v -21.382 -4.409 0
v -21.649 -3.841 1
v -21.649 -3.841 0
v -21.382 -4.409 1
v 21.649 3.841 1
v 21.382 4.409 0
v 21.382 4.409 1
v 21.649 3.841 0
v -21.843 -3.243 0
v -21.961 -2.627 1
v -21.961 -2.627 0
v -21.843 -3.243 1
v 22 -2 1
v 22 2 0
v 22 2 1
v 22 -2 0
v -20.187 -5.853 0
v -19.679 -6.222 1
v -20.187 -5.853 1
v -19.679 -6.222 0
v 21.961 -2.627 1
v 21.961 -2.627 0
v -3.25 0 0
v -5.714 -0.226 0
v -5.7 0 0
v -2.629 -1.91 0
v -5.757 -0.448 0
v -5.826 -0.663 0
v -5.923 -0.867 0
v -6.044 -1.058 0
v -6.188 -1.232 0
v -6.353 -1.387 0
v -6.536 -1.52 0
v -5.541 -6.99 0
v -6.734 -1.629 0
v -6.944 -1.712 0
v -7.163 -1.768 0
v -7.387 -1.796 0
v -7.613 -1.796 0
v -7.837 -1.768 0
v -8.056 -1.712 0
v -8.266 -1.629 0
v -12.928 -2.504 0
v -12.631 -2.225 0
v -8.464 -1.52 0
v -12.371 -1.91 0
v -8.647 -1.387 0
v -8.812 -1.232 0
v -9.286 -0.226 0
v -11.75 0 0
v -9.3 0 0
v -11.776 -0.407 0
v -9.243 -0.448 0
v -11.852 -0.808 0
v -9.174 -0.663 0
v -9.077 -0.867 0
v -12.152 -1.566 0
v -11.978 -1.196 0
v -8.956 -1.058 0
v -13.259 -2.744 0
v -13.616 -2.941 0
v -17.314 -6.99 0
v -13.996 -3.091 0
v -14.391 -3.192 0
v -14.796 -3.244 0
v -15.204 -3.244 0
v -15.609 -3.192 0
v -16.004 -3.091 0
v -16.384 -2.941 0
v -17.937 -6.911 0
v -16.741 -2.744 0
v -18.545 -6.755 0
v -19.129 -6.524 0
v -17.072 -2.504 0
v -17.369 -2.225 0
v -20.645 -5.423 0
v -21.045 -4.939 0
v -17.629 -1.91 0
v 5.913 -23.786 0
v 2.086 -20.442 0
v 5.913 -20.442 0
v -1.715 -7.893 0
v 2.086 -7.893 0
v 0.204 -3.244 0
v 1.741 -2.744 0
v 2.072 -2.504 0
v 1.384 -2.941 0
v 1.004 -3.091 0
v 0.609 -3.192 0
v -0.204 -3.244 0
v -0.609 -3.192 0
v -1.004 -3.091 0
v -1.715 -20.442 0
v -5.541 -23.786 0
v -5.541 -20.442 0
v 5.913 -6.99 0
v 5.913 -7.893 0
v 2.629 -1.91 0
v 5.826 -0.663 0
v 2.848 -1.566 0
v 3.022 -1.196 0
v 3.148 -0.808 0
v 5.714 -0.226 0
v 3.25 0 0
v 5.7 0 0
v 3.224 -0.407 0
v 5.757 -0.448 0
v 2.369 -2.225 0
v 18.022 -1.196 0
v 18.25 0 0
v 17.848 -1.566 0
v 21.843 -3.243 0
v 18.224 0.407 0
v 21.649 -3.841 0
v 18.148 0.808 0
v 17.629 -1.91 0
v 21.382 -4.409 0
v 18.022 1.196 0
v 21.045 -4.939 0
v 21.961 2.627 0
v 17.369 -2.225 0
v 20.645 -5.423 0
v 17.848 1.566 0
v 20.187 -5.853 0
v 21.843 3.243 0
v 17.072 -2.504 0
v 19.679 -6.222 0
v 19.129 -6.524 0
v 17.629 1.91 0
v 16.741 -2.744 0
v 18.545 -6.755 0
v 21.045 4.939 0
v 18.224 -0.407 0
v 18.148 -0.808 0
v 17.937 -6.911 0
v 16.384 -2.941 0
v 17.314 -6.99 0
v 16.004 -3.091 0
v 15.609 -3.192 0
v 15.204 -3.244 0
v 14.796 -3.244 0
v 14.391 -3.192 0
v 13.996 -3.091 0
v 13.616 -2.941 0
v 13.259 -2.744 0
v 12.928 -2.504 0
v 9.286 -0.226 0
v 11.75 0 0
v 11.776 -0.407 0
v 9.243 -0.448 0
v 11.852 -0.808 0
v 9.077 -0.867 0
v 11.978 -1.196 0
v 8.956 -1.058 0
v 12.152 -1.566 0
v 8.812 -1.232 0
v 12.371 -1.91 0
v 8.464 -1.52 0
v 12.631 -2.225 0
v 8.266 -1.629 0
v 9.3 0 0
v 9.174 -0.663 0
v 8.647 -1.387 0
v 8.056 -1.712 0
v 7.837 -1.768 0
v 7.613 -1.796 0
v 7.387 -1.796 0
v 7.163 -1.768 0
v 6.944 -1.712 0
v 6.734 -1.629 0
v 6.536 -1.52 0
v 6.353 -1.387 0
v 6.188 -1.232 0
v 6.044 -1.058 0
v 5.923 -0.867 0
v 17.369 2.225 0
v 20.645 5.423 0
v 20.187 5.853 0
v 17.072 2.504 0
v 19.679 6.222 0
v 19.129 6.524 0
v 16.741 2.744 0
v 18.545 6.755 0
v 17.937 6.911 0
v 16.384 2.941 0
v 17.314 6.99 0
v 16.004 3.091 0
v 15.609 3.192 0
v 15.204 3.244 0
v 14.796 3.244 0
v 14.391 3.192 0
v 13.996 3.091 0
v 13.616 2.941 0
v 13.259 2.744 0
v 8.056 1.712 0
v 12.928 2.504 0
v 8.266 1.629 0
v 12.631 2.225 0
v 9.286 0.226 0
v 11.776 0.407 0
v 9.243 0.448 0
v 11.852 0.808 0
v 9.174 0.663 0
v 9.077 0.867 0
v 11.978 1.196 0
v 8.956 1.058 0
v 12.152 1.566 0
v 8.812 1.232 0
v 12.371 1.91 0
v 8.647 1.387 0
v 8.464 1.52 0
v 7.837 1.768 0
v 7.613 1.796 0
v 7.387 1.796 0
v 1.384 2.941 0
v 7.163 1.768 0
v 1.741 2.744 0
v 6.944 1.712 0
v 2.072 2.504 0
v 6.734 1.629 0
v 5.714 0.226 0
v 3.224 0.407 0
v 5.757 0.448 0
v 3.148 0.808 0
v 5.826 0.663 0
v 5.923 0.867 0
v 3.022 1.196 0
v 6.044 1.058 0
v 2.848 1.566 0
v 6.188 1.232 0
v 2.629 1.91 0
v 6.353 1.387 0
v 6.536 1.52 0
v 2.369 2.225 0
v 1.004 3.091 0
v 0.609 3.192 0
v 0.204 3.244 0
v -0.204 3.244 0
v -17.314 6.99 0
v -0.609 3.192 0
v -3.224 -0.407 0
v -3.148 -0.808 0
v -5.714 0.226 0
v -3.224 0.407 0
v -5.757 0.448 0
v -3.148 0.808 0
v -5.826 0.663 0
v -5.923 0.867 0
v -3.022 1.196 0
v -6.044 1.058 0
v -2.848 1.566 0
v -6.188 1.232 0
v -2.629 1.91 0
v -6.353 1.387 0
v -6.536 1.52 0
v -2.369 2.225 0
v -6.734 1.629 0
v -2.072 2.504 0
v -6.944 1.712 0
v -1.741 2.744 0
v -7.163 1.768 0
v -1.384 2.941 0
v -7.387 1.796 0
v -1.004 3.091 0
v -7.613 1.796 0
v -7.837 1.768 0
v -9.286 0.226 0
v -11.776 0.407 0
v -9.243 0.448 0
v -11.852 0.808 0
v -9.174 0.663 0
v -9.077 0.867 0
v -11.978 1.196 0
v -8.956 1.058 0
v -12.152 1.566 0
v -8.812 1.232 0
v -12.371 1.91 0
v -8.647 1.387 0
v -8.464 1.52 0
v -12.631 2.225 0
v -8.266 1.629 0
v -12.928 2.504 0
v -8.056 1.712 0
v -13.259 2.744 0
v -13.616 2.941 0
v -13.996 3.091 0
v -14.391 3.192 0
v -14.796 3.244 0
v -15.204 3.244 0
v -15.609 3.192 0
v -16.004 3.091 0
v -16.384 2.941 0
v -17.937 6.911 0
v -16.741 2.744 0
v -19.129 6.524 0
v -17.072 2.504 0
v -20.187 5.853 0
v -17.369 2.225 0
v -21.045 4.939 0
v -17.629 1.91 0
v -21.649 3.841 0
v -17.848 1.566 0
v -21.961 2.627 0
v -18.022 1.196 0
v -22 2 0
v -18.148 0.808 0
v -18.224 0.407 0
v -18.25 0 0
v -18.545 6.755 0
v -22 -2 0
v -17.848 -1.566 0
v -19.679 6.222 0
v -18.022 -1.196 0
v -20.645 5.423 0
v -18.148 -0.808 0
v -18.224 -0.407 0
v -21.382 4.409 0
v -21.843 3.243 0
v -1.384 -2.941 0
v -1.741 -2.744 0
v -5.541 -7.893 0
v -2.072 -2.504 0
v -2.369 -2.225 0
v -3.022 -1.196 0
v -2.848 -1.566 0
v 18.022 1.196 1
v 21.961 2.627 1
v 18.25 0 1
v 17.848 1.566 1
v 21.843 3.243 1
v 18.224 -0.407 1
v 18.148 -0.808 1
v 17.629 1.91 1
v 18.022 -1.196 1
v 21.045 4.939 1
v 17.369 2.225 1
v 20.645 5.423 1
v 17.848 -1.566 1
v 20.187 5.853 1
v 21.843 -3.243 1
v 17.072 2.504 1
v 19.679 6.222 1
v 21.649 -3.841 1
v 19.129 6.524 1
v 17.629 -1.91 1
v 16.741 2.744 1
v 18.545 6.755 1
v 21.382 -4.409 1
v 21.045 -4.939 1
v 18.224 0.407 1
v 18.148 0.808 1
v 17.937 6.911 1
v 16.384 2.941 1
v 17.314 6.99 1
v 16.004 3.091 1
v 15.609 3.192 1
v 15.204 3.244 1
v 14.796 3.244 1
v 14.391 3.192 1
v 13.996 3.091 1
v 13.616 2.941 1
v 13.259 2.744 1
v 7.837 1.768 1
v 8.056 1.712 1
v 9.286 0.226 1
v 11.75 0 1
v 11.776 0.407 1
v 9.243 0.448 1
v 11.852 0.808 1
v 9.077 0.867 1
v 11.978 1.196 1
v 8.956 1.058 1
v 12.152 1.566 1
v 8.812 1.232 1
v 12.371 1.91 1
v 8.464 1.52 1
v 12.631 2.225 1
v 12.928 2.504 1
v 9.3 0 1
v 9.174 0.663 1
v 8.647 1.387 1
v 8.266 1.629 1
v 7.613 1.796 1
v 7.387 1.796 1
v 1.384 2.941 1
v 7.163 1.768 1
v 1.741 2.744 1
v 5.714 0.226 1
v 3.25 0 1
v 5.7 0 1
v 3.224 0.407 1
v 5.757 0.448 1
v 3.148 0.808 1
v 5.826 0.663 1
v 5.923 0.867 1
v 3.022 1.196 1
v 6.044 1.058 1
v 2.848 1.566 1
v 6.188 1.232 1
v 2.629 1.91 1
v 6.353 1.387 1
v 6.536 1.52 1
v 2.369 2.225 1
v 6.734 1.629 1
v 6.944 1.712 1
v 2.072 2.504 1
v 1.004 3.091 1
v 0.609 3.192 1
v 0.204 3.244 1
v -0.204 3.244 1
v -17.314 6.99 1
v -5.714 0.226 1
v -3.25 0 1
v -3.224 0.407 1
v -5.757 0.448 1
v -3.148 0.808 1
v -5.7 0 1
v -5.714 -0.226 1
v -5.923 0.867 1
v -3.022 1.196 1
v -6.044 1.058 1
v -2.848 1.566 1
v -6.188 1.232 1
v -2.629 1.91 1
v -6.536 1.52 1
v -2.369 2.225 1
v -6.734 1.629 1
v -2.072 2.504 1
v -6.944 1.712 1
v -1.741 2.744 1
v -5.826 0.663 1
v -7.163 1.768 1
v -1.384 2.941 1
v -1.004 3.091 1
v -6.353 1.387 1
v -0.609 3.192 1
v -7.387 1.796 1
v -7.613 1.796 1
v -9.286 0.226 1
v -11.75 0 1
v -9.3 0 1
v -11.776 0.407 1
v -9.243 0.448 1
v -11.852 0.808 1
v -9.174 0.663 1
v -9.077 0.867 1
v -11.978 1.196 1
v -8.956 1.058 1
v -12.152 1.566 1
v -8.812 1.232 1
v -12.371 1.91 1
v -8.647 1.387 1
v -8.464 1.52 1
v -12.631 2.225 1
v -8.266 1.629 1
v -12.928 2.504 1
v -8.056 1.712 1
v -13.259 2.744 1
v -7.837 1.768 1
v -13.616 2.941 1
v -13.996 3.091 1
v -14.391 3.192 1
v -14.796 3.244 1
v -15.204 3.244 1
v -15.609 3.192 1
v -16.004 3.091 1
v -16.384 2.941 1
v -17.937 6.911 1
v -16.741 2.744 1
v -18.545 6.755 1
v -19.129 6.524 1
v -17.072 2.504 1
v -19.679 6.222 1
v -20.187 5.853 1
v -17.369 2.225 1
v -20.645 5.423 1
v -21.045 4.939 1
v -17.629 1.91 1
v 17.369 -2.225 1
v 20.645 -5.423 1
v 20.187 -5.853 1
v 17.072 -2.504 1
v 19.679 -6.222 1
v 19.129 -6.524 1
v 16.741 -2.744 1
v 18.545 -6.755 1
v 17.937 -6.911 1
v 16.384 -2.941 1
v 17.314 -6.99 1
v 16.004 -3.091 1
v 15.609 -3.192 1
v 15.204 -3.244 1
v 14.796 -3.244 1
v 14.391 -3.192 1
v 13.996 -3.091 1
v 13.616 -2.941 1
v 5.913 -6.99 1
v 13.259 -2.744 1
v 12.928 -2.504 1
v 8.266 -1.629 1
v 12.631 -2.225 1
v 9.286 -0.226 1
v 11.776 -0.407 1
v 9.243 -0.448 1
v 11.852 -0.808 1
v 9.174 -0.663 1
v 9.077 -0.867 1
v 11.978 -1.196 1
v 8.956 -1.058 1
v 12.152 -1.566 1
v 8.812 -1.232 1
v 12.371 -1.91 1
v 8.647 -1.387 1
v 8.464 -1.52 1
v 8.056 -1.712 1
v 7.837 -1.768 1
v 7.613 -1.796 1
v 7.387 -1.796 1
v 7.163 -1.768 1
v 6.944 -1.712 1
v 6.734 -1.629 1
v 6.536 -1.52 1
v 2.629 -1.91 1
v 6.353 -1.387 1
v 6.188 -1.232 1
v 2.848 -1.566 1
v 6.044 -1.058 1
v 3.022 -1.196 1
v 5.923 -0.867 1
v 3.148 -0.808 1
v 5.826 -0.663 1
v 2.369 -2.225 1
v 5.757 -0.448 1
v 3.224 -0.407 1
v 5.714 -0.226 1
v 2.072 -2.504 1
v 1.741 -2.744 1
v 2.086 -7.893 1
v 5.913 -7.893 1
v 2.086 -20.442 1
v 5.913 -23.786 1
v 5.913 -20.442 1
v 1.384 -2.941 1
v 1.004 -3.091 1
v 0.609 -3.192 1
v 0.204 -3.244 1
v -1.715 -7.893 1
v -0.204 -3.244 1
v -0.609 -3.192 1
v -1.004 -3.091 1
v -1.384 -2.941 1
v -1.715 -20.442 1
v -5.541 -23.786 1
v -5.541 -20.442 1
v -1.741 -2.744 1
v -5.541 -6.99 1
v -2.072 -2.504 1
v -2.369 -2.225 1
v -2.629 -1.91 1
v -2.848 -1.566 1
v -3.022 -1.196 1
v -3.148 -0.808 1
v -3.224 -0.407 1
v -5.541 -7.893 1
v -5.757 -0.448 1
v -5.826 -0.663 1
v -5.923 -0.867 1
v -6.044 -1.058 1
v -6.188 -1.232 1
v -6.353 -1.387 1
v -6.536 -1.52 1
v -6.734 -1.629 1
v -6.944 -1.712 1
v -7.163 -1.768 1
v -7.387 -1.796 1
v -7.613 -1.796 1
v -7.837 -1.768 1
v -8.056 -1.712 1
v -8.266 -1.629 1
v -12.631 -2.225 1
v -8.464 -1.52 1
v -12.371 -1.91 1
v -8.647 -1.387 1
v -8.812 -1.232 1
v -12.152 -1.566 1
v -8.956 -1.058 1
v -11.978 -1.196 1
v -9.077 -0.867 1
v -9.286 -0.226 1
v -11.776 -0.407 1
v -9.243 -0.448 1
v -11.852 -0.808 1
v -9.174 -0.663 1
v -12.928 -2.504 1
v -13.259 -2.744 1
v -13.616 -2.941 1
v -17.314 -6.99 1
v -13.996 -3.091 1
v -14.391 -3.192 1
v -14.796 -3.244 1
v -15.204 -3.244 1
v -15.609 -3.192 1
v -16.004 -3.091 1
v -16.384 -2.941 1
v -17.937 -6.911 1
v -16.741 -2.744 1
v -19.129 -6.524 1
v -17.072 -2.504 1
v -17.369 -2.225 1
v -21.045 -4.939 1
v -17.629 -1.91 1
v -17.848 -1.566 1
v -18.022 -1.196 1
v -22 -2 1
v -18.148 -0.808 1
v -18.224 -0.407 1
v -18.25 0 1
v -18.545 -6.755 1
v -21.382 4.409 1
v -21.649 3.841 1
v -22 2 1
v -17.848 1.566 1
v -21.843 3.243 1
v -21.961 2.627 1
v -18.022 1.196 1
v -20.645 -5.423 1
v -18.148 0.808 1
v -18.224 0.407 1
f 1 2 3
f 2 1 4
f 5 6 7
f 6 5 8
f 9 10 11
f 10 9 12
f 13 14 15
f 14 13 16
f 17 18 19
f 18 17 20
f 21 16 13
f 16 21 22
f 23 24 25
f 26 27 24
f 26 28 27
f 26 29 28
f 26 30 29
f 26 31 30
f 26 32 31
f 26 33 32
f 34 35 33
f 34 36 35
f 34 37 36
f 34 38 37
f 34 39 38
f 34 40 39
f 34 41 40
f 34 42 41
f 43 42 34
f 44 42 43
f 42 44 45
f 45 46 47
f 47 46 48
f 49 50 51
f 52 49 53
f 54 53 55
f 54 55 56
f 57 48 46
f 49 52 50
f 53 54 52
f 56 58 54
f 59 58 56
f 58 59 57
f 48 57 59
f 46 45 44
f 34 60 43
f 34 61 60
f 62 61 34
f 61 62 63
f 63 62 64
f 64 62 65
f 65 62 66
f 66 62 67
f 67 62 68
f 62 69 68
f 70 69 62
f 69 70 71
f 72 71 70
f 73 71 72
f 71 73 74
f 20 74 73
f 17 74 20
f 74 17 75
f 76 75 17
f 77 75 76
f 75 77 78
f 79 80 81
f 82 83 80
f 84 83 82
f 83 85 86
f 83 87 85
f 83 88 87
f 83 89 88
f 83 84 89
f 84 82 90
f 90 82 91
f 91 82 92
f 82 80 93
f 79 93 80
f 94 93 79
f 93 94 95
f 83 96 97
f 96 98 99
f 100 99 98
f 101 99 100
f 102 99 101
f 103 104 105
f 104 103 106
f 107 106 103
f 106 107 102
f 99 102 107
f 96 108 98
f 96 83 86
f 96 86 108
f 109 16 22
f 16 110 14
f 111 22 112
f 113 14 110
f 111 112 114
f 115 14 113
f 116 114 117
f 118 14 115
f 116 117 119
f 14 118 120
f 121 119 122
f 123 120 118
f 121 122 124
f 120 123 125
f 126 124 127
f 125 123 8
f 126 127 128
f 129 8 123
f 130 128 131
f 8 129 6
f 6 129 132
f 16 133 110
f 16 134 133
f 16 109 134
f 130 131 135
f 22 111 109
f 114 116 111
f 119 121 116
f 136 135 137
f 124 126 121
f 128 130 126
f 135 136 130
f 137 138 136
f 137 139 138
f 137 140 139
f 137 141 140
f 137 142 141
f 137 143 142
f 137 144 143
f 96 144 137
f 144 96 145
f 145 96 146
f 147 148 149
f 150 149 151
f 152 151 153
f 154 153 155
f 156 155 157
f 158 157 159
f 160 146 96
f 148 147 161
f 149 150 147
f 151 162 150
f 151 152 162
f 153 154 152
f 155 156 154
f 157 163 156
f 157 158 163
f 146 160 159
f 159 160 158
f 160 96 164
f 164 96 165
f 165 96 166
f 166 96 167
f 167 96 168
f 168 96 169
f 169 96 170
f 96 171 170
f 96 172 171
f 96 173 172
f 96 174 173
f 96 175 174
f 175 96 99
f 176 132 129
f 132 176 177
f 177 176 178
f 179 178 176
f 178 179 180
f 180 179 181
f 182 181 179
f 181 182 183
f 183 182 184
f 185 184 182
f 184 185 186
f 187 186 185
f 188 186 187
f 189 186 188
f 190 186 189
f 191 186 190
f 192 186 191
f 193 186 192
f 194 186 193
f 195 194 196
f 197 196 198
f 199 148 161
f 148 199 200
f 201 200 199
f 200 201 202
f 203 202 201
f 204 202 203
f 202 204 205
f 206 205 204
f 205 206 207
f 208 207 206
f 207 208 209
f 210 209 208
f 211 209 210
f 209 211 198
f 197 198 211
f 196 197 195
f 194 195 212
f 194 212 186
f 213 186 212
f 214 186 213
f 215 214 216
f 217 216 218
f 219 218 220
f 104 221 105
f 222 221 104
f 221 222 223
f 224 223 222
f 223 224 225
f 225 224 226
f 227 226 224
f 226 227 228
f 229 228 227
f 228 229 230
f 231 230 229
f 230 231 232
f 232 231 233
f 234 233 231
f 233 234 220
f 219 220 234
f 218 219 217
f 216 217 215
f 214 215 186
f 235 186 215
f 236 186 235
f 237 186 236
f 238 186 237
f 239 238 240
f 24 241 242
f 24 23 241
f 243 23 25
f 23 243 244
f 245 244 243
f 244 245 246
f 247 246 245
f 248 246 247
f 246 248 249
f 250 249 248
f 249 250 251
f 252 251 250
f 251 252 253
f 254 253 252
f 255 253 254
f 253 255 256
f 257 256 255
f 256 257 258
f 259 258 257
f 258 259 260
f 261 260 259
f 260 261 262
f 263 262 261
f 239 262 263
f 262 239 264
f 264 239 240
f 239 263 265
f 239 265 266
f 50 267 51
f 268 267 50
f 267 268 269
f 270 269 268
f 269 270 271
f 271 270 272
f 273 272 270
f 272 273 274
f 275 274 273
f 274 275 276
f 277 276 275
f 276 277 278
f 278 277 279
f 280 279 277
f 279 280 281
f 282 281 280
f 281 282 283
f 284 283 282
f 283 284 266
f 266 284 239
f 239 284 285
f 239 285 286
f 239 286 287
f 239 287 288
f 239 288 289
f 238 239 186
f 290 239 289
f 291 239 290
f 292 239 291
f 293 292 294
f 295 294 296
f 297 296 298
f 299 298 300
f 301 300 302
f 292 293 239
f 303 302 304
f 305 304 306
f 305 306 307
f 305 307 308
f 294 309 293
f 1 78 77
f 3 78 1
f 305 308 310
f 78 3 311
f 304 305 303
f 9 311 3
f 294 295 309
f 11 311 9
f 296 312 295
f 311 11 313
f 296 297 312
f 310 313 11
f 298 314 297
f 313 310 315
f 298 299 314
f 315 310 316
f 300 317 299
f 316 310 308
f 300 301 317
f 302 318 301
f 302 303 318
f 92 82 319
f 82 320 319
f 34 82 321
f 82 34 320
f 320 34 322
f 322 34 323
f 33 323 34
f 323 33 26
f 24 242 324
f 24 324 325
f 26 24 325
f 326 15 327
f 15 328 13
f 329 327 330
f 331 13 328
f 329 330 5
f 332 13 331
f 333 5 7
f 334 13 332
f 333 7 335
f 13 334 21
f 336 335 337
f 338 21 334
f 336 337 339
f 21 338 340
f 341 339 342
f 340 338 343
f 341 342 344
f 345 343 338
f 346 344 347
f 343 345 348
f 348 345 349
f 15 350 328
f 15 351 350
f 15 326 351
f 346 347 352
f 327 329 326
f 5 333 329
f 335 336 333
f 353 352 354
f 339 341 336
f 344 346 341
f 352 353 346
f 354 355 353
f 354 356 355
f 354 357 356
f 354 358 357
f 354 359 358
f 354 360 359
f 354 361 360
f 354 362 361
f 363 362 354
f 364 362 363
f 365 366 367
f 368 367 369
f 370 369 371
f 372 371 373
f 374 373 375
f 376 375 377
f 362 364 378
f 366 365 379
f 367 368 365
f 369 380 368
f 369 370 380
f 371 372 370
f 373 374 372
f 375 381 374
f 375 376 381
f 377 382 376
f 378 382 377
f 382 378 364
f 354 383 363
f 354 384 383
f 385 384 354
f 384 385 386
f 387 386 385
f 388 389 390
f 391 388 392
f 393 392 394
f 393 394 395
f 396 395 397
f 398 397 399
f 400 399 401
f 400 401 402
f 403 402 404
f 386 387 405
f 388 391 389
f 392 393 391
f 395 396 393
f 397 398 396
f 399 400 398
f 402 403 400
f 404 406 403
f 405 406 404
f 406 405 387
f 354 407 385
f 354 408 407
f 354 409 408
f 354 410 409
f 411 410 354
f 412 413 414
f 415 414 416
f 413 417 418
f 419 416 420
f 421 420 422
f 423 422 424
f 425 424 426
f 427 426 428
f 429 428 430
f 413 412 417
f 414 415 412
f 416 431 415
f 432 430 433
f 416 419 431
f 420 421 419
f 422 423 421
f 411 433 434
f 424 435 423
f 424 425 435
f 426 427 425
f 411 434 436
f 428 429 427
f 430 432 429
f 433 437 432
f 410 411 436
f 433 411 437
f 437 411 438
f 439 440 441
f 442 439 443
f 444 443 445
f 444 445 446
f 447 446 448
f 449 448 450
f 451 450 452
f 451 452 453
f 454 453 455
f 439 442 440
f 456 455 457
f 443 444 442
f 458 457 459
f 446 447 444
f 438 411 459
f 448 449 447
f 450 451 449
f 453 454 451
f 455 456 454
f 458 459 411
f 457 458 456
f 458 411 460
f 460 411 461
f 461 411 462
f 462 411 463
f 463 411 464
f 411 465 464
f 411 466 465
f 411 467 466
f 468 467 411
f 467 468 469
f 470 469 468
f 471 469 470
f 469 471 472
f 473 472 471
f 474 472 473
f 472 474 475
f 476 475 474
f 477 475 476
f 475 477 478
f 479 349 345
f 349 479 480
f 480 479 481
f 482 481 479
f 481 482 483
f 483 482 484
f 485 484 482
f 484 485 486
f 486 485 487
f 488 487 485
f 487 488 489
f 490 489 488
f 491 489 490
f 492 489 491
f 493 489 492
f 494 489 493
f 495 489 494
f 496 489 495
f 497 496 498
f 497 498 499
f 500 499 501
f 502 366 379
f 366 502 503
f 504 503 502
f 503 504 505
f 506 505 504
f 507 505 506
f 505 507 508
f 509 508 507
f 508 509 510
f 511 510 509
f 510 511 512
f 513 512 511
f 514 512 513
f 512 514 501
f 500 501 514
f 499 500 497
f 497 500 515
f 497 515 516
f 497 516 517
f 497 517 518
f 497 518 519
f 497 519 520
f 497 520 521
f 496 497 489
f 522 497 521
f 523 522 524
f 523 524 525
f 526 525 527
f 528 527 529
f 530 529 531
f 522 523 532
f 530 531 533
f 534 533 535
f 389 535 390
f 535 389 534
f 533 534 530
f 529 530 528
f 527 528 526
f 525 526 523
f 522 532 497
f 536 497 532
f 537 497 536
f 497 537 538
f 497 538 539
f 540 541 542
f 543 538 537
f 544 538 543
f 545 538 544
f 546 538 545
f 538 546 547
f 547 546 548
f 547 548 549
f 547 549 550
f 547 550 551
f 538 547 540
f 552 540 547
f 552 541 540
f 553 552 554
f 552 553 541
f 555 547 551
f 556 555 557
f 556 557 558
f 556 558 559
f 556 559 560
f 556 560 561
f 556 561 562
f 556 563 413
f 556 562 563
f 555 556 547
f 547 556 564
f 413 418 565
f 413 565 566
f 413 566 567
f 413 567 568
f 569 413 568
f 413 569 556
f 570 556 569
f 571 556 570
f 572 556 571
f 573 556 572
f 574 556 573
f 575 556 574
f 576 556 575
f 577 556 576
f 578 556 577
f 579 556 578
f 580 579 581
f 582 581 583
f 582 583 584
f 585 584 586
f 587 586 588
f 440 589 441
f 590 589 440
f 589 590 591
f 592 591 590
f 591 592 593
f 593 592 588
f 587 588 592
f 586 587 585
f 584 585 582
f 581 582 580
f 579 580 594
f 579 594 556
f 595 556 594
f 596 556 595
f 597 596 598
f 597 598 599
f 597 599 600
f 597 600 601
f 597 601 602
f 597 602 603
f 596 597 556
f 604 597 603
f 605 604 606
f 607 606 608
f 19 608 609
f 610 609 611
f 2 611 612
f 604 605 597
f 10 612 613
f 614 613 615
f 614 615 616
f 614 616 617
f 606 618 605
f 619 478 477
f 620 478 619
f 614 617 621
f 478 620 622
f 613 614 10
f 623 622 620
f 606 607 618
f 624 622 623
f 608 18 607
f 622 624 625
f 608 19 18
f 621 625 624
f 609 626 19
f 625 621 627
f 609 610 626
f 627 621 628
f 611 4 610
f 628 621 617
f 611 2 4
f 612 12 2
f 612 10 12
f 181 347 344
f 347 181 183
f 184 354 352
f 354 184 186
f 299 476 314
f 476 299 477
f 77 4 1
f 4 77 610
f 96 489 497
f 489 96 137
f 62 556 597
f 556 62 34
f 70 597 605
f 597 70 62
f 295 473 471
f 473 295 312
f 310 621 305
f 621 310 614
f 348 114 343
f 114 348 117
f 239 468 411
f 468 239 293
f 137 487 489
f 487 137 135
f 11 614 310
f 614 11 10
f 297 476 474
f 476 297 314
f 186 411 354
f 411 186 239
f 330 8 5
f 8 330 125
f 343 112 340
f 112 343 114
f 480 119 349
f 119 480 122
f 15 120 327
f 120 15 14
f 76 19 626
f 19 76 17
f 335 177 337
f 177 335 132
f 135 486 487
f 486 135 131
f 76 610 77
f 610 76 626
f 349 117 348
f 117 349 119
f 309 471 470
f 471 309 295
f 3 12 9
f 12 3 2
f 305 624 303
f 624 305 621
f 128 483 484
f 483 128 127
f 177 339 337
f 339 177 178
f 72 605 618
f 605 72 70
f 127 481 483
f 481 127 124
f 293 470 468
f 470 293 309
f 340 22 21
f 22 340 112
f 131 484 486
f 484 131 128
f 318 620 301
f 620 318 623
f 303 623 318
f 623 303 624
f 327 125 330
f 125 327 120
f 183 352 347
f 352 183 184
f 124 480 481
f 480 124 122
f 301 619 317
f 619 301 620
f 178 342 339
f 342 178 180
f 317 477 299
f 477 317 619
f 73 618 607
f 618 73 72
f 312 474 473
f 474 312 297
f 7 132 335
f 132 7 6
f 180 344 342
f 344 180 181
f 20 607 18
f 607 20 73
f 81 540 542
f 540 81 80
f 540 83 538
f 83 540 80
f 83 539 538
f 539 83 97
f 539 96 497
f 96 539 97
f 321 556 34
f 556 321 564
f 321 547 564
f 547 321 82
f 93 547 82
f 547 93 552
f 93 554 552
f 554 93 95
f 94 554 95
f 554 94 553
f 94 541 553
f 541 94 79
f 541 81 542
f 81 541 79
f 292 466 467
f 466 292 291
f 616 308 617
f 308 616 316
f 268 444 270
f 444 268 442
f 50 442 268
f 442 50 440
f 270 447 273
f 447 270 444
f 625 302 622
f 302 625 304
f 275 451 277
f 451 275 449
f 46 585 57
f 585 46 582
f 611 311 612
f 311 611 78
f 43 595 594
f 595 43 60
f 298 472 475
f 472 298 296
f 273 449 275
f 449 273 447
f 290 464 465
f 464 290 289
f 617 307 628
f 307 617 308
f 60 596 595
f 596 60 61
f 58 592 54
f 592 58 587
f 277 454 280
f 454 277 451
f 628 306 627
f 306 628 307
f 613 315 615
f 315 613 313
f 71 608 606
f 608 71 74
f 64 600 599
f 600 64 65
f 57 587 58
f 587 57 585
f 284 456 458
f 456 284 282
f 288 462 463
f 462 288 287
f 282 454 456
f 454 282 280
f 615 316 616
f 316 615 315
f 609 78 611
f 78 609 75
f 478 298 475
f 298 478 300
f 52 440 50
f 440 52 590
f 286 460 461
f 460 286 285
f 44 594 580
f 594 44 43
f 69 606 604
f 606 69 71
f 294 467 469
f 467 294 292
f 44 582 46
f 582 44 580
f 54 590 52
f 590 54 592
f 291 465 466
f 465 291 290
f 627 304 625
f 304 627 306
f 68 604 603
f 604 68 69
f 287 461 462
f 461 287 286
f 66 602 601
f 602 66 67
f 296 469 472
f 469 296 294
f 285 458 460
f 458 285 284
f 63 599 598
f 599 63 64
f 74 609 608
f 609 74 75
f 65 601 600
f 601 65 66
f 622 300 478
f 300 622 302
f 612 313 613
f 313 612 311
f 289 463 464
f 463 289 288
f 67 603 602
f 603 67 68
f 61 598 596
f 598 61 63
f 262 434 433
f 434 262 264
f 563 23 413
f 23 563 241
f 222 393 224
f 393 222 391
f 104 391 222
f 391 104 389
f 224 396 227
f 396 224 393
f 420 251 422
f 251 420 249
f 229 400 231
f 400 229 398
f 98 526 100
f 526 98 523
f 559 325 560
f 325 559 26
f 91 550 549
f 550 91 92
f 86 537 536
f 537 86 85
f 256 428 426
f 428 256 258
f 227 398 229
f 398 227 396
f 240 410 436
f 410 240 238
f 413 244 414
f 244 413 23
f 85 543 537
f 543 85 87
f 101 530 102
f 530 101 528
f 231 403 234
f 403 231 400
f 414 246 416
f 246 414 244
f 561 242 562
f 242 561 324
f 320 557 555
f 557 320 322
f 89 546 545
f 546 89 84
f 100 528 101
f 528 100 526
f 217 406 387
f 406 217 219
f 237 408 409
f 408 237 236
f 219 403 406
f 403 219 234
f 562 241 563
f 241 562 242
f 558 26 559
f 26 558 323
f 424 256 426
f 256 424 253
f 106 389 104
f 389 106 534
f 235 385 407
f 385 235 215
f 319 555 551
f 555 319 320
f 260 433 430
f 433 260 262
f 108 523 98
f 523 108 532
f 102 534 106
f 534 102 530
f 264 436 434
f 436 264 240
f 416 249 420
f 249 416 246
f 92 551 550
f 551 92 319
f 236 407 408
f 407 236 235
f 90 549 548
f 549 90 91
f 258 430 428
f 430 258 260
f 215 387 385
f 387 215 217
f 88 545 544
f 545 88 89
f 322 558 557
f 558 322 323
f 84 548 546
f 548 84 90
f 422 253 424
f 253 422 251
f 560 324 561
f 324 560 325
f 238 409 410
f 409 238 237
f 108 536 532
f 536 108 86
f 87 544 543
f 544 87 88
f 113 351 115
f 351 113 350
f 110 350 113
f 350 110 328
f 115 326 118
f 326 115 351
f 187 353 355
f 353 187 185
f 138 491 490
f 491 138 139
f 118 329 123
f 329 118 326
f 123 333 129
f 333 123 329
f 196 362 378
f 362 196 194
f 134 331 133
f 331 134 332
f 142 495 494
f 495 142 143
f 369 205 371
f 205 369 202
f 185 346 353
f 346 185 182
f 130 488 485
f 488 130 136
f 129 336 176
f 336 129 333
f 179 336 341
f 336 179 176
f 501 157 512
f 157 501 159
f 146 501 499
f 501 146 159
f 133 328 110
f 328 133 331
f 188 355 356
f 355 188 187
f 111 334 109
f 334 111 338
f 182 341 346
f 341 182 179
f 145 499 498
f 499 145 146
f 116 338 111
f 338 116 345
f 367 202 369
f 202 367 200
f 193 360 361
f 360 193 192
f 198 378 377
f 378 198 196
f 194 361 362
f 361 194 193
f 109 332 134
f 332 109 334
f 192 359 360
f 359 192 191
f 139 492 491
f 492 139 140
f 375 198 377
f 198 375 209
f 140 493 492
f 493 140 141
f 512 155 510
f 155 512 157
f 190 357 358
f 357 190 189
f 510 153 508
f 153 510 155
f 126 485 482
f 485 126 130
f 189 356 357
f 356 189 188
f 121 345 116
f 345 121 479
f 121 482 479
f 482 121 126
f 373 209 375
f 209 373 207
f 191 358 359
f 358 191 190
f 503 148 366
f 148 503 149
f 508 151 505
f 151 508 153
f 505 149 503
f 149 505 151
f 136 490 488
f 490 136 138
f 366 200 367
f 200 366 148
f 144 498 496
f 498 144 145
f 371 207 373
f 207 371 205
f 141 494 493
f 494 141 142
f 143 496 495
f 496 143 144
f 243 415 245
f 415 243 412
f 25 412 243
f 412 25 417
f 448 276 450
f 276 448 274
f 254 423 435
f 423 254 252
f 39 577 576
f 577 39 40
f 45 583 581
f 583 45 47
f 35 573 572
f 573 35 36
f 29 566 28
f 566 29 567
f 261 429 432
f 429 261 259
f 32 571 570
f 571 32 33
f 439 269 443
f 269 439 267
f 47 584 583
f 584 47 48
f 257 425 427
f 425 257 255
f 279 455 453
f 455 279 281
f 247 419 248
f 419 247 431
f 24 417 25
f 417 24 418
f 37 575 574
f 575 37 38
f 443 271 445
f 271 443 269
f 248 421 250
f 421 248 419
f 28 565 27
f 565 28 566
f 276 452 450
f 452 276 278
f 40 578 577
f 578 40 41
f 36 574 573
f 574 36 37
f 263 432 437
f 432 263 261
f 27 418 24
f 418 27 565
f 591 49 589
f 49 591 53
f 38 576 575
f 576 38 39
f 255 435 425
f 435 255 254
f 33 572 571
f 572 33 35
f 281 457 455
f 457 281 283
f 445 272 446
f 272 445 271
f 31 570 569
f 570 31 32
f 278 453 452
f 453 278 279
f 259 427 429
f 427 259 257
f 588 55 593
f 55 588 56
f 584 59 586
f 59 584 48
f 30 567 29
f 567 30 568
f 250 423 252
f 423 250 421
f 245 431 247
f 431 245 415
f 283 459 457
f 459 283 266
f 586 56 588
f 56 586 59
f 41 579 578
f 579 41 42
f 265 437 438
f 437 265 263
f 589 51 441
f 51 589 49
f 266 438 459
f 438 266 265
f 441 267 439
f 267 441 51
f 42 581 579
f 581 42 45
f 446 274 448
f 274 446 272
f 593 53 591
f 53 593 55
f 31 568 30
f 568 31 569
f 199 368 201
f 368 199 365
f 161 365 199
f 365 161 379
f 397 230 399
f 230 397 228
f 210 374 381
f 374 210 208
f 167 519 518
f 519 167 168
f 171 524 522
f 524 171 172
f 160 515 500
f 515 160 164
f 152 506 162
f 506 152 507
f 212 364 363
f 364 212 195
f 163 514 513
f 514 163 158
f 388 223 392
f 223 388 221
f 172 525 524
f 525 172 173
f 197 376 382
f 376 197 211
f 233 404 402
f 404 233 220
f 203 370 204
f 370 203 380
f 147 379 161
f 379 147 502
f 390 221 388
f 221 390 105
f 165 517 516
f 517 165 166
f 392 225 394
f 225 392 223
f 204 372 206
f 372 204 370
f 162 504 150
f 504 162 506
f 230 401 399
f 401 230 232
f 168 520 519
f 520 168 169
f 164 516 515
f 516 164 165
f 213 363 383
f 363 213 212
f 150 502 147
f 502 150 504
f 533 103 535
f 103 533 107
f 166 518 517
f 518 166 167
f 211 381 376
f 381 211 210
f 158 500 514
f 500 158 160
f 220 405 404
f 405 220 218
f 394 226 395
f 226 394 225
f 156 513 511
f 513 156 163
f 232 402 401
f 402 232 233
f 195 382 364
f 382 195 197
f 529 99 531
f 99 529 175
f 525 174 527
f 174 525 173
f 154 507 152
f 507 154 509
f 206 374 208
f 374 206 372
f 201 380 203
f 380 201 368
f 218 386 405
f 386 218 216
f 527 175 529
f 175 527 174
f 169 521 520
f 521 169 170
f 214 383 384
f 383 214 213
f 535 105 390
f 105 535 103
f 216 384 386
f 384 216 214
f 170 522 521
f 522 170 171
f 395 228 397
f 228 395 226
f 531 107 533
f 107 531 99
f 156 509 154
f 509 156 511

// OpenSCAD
$fn = 50;


difference() {
	union() {
		hull() {
			translate(v = [-17.0000000000, 2.0000000000, 0]) {
				cylinder(h = 1, r = 5);
			}
			translate(v = [17.0000000000, 2.0000000000, 0]) {
				cylinder(h = 1, r = 5);
			}
			translate(v = [-17.0000000000, -2.0000000000, 0]) {
				cylinder(h = 1, r = 5);
			}
			translate(v = [17.0000000000, -2.0000000000, 0]) {
				cylinder(h = 1, r = 5);
			}
		}
		translate(v = [0, -5, 0]) {
			linear_extrude(height = 1) {
				text(font = "DejaVu Sans Mono:style=Bold", halign = "center", size = 19.0000000000, text = "I", valign = "top");
			}
		}
	}
	union() {
		translate(v = [-15.0000000000, 0.0000000000, 0]) {
			translate(v = [0, 0, -100]) {
				cylinder(h = 200, r = 3.2500000000);
			}
		}
		translate(v = [0, 0, -100]) {
			cylinder(h = 200, r = 3.2500000000);
		}
		translate(v = [15.0000000000, 0.0000000000, 0]) {
			translate(v = [0, 0, -100]) {
				cylinder(h = 200, r = 3.2500000000);
			}
		}
		translate(v = [-15.0000000000, 0.0000000000, 0]) {
			translate(v = [0, 0, -100]) {
				cylinder(h = 200, r = 1.8000000000);
			}
		}
		translate(v = [-7.5000000000, 0.0000000000, 0]) {
			translate(v = [0, 0, -100]) {
				cylinder(h = 200, r = 1.8000000000);
			}
		}
		translate(v = [0, 0, -100]) {
			cylinder(h = 200, r = 1.8000000000);
		}
		translate(v = [7.5000000000, 0.0000000000, 0]) {
			translate(v = [0, 0, -100]) {
				cylinder(h = 200, r = 1.8000000000);
			}
		}
		translate(v = [15.0000000000, 0.0000000000, 0]) {
			translate(v = [0, 0, -100]) {
				cylinder(h = 200, r = 1.8000000000);
			}
		}
	}
}
